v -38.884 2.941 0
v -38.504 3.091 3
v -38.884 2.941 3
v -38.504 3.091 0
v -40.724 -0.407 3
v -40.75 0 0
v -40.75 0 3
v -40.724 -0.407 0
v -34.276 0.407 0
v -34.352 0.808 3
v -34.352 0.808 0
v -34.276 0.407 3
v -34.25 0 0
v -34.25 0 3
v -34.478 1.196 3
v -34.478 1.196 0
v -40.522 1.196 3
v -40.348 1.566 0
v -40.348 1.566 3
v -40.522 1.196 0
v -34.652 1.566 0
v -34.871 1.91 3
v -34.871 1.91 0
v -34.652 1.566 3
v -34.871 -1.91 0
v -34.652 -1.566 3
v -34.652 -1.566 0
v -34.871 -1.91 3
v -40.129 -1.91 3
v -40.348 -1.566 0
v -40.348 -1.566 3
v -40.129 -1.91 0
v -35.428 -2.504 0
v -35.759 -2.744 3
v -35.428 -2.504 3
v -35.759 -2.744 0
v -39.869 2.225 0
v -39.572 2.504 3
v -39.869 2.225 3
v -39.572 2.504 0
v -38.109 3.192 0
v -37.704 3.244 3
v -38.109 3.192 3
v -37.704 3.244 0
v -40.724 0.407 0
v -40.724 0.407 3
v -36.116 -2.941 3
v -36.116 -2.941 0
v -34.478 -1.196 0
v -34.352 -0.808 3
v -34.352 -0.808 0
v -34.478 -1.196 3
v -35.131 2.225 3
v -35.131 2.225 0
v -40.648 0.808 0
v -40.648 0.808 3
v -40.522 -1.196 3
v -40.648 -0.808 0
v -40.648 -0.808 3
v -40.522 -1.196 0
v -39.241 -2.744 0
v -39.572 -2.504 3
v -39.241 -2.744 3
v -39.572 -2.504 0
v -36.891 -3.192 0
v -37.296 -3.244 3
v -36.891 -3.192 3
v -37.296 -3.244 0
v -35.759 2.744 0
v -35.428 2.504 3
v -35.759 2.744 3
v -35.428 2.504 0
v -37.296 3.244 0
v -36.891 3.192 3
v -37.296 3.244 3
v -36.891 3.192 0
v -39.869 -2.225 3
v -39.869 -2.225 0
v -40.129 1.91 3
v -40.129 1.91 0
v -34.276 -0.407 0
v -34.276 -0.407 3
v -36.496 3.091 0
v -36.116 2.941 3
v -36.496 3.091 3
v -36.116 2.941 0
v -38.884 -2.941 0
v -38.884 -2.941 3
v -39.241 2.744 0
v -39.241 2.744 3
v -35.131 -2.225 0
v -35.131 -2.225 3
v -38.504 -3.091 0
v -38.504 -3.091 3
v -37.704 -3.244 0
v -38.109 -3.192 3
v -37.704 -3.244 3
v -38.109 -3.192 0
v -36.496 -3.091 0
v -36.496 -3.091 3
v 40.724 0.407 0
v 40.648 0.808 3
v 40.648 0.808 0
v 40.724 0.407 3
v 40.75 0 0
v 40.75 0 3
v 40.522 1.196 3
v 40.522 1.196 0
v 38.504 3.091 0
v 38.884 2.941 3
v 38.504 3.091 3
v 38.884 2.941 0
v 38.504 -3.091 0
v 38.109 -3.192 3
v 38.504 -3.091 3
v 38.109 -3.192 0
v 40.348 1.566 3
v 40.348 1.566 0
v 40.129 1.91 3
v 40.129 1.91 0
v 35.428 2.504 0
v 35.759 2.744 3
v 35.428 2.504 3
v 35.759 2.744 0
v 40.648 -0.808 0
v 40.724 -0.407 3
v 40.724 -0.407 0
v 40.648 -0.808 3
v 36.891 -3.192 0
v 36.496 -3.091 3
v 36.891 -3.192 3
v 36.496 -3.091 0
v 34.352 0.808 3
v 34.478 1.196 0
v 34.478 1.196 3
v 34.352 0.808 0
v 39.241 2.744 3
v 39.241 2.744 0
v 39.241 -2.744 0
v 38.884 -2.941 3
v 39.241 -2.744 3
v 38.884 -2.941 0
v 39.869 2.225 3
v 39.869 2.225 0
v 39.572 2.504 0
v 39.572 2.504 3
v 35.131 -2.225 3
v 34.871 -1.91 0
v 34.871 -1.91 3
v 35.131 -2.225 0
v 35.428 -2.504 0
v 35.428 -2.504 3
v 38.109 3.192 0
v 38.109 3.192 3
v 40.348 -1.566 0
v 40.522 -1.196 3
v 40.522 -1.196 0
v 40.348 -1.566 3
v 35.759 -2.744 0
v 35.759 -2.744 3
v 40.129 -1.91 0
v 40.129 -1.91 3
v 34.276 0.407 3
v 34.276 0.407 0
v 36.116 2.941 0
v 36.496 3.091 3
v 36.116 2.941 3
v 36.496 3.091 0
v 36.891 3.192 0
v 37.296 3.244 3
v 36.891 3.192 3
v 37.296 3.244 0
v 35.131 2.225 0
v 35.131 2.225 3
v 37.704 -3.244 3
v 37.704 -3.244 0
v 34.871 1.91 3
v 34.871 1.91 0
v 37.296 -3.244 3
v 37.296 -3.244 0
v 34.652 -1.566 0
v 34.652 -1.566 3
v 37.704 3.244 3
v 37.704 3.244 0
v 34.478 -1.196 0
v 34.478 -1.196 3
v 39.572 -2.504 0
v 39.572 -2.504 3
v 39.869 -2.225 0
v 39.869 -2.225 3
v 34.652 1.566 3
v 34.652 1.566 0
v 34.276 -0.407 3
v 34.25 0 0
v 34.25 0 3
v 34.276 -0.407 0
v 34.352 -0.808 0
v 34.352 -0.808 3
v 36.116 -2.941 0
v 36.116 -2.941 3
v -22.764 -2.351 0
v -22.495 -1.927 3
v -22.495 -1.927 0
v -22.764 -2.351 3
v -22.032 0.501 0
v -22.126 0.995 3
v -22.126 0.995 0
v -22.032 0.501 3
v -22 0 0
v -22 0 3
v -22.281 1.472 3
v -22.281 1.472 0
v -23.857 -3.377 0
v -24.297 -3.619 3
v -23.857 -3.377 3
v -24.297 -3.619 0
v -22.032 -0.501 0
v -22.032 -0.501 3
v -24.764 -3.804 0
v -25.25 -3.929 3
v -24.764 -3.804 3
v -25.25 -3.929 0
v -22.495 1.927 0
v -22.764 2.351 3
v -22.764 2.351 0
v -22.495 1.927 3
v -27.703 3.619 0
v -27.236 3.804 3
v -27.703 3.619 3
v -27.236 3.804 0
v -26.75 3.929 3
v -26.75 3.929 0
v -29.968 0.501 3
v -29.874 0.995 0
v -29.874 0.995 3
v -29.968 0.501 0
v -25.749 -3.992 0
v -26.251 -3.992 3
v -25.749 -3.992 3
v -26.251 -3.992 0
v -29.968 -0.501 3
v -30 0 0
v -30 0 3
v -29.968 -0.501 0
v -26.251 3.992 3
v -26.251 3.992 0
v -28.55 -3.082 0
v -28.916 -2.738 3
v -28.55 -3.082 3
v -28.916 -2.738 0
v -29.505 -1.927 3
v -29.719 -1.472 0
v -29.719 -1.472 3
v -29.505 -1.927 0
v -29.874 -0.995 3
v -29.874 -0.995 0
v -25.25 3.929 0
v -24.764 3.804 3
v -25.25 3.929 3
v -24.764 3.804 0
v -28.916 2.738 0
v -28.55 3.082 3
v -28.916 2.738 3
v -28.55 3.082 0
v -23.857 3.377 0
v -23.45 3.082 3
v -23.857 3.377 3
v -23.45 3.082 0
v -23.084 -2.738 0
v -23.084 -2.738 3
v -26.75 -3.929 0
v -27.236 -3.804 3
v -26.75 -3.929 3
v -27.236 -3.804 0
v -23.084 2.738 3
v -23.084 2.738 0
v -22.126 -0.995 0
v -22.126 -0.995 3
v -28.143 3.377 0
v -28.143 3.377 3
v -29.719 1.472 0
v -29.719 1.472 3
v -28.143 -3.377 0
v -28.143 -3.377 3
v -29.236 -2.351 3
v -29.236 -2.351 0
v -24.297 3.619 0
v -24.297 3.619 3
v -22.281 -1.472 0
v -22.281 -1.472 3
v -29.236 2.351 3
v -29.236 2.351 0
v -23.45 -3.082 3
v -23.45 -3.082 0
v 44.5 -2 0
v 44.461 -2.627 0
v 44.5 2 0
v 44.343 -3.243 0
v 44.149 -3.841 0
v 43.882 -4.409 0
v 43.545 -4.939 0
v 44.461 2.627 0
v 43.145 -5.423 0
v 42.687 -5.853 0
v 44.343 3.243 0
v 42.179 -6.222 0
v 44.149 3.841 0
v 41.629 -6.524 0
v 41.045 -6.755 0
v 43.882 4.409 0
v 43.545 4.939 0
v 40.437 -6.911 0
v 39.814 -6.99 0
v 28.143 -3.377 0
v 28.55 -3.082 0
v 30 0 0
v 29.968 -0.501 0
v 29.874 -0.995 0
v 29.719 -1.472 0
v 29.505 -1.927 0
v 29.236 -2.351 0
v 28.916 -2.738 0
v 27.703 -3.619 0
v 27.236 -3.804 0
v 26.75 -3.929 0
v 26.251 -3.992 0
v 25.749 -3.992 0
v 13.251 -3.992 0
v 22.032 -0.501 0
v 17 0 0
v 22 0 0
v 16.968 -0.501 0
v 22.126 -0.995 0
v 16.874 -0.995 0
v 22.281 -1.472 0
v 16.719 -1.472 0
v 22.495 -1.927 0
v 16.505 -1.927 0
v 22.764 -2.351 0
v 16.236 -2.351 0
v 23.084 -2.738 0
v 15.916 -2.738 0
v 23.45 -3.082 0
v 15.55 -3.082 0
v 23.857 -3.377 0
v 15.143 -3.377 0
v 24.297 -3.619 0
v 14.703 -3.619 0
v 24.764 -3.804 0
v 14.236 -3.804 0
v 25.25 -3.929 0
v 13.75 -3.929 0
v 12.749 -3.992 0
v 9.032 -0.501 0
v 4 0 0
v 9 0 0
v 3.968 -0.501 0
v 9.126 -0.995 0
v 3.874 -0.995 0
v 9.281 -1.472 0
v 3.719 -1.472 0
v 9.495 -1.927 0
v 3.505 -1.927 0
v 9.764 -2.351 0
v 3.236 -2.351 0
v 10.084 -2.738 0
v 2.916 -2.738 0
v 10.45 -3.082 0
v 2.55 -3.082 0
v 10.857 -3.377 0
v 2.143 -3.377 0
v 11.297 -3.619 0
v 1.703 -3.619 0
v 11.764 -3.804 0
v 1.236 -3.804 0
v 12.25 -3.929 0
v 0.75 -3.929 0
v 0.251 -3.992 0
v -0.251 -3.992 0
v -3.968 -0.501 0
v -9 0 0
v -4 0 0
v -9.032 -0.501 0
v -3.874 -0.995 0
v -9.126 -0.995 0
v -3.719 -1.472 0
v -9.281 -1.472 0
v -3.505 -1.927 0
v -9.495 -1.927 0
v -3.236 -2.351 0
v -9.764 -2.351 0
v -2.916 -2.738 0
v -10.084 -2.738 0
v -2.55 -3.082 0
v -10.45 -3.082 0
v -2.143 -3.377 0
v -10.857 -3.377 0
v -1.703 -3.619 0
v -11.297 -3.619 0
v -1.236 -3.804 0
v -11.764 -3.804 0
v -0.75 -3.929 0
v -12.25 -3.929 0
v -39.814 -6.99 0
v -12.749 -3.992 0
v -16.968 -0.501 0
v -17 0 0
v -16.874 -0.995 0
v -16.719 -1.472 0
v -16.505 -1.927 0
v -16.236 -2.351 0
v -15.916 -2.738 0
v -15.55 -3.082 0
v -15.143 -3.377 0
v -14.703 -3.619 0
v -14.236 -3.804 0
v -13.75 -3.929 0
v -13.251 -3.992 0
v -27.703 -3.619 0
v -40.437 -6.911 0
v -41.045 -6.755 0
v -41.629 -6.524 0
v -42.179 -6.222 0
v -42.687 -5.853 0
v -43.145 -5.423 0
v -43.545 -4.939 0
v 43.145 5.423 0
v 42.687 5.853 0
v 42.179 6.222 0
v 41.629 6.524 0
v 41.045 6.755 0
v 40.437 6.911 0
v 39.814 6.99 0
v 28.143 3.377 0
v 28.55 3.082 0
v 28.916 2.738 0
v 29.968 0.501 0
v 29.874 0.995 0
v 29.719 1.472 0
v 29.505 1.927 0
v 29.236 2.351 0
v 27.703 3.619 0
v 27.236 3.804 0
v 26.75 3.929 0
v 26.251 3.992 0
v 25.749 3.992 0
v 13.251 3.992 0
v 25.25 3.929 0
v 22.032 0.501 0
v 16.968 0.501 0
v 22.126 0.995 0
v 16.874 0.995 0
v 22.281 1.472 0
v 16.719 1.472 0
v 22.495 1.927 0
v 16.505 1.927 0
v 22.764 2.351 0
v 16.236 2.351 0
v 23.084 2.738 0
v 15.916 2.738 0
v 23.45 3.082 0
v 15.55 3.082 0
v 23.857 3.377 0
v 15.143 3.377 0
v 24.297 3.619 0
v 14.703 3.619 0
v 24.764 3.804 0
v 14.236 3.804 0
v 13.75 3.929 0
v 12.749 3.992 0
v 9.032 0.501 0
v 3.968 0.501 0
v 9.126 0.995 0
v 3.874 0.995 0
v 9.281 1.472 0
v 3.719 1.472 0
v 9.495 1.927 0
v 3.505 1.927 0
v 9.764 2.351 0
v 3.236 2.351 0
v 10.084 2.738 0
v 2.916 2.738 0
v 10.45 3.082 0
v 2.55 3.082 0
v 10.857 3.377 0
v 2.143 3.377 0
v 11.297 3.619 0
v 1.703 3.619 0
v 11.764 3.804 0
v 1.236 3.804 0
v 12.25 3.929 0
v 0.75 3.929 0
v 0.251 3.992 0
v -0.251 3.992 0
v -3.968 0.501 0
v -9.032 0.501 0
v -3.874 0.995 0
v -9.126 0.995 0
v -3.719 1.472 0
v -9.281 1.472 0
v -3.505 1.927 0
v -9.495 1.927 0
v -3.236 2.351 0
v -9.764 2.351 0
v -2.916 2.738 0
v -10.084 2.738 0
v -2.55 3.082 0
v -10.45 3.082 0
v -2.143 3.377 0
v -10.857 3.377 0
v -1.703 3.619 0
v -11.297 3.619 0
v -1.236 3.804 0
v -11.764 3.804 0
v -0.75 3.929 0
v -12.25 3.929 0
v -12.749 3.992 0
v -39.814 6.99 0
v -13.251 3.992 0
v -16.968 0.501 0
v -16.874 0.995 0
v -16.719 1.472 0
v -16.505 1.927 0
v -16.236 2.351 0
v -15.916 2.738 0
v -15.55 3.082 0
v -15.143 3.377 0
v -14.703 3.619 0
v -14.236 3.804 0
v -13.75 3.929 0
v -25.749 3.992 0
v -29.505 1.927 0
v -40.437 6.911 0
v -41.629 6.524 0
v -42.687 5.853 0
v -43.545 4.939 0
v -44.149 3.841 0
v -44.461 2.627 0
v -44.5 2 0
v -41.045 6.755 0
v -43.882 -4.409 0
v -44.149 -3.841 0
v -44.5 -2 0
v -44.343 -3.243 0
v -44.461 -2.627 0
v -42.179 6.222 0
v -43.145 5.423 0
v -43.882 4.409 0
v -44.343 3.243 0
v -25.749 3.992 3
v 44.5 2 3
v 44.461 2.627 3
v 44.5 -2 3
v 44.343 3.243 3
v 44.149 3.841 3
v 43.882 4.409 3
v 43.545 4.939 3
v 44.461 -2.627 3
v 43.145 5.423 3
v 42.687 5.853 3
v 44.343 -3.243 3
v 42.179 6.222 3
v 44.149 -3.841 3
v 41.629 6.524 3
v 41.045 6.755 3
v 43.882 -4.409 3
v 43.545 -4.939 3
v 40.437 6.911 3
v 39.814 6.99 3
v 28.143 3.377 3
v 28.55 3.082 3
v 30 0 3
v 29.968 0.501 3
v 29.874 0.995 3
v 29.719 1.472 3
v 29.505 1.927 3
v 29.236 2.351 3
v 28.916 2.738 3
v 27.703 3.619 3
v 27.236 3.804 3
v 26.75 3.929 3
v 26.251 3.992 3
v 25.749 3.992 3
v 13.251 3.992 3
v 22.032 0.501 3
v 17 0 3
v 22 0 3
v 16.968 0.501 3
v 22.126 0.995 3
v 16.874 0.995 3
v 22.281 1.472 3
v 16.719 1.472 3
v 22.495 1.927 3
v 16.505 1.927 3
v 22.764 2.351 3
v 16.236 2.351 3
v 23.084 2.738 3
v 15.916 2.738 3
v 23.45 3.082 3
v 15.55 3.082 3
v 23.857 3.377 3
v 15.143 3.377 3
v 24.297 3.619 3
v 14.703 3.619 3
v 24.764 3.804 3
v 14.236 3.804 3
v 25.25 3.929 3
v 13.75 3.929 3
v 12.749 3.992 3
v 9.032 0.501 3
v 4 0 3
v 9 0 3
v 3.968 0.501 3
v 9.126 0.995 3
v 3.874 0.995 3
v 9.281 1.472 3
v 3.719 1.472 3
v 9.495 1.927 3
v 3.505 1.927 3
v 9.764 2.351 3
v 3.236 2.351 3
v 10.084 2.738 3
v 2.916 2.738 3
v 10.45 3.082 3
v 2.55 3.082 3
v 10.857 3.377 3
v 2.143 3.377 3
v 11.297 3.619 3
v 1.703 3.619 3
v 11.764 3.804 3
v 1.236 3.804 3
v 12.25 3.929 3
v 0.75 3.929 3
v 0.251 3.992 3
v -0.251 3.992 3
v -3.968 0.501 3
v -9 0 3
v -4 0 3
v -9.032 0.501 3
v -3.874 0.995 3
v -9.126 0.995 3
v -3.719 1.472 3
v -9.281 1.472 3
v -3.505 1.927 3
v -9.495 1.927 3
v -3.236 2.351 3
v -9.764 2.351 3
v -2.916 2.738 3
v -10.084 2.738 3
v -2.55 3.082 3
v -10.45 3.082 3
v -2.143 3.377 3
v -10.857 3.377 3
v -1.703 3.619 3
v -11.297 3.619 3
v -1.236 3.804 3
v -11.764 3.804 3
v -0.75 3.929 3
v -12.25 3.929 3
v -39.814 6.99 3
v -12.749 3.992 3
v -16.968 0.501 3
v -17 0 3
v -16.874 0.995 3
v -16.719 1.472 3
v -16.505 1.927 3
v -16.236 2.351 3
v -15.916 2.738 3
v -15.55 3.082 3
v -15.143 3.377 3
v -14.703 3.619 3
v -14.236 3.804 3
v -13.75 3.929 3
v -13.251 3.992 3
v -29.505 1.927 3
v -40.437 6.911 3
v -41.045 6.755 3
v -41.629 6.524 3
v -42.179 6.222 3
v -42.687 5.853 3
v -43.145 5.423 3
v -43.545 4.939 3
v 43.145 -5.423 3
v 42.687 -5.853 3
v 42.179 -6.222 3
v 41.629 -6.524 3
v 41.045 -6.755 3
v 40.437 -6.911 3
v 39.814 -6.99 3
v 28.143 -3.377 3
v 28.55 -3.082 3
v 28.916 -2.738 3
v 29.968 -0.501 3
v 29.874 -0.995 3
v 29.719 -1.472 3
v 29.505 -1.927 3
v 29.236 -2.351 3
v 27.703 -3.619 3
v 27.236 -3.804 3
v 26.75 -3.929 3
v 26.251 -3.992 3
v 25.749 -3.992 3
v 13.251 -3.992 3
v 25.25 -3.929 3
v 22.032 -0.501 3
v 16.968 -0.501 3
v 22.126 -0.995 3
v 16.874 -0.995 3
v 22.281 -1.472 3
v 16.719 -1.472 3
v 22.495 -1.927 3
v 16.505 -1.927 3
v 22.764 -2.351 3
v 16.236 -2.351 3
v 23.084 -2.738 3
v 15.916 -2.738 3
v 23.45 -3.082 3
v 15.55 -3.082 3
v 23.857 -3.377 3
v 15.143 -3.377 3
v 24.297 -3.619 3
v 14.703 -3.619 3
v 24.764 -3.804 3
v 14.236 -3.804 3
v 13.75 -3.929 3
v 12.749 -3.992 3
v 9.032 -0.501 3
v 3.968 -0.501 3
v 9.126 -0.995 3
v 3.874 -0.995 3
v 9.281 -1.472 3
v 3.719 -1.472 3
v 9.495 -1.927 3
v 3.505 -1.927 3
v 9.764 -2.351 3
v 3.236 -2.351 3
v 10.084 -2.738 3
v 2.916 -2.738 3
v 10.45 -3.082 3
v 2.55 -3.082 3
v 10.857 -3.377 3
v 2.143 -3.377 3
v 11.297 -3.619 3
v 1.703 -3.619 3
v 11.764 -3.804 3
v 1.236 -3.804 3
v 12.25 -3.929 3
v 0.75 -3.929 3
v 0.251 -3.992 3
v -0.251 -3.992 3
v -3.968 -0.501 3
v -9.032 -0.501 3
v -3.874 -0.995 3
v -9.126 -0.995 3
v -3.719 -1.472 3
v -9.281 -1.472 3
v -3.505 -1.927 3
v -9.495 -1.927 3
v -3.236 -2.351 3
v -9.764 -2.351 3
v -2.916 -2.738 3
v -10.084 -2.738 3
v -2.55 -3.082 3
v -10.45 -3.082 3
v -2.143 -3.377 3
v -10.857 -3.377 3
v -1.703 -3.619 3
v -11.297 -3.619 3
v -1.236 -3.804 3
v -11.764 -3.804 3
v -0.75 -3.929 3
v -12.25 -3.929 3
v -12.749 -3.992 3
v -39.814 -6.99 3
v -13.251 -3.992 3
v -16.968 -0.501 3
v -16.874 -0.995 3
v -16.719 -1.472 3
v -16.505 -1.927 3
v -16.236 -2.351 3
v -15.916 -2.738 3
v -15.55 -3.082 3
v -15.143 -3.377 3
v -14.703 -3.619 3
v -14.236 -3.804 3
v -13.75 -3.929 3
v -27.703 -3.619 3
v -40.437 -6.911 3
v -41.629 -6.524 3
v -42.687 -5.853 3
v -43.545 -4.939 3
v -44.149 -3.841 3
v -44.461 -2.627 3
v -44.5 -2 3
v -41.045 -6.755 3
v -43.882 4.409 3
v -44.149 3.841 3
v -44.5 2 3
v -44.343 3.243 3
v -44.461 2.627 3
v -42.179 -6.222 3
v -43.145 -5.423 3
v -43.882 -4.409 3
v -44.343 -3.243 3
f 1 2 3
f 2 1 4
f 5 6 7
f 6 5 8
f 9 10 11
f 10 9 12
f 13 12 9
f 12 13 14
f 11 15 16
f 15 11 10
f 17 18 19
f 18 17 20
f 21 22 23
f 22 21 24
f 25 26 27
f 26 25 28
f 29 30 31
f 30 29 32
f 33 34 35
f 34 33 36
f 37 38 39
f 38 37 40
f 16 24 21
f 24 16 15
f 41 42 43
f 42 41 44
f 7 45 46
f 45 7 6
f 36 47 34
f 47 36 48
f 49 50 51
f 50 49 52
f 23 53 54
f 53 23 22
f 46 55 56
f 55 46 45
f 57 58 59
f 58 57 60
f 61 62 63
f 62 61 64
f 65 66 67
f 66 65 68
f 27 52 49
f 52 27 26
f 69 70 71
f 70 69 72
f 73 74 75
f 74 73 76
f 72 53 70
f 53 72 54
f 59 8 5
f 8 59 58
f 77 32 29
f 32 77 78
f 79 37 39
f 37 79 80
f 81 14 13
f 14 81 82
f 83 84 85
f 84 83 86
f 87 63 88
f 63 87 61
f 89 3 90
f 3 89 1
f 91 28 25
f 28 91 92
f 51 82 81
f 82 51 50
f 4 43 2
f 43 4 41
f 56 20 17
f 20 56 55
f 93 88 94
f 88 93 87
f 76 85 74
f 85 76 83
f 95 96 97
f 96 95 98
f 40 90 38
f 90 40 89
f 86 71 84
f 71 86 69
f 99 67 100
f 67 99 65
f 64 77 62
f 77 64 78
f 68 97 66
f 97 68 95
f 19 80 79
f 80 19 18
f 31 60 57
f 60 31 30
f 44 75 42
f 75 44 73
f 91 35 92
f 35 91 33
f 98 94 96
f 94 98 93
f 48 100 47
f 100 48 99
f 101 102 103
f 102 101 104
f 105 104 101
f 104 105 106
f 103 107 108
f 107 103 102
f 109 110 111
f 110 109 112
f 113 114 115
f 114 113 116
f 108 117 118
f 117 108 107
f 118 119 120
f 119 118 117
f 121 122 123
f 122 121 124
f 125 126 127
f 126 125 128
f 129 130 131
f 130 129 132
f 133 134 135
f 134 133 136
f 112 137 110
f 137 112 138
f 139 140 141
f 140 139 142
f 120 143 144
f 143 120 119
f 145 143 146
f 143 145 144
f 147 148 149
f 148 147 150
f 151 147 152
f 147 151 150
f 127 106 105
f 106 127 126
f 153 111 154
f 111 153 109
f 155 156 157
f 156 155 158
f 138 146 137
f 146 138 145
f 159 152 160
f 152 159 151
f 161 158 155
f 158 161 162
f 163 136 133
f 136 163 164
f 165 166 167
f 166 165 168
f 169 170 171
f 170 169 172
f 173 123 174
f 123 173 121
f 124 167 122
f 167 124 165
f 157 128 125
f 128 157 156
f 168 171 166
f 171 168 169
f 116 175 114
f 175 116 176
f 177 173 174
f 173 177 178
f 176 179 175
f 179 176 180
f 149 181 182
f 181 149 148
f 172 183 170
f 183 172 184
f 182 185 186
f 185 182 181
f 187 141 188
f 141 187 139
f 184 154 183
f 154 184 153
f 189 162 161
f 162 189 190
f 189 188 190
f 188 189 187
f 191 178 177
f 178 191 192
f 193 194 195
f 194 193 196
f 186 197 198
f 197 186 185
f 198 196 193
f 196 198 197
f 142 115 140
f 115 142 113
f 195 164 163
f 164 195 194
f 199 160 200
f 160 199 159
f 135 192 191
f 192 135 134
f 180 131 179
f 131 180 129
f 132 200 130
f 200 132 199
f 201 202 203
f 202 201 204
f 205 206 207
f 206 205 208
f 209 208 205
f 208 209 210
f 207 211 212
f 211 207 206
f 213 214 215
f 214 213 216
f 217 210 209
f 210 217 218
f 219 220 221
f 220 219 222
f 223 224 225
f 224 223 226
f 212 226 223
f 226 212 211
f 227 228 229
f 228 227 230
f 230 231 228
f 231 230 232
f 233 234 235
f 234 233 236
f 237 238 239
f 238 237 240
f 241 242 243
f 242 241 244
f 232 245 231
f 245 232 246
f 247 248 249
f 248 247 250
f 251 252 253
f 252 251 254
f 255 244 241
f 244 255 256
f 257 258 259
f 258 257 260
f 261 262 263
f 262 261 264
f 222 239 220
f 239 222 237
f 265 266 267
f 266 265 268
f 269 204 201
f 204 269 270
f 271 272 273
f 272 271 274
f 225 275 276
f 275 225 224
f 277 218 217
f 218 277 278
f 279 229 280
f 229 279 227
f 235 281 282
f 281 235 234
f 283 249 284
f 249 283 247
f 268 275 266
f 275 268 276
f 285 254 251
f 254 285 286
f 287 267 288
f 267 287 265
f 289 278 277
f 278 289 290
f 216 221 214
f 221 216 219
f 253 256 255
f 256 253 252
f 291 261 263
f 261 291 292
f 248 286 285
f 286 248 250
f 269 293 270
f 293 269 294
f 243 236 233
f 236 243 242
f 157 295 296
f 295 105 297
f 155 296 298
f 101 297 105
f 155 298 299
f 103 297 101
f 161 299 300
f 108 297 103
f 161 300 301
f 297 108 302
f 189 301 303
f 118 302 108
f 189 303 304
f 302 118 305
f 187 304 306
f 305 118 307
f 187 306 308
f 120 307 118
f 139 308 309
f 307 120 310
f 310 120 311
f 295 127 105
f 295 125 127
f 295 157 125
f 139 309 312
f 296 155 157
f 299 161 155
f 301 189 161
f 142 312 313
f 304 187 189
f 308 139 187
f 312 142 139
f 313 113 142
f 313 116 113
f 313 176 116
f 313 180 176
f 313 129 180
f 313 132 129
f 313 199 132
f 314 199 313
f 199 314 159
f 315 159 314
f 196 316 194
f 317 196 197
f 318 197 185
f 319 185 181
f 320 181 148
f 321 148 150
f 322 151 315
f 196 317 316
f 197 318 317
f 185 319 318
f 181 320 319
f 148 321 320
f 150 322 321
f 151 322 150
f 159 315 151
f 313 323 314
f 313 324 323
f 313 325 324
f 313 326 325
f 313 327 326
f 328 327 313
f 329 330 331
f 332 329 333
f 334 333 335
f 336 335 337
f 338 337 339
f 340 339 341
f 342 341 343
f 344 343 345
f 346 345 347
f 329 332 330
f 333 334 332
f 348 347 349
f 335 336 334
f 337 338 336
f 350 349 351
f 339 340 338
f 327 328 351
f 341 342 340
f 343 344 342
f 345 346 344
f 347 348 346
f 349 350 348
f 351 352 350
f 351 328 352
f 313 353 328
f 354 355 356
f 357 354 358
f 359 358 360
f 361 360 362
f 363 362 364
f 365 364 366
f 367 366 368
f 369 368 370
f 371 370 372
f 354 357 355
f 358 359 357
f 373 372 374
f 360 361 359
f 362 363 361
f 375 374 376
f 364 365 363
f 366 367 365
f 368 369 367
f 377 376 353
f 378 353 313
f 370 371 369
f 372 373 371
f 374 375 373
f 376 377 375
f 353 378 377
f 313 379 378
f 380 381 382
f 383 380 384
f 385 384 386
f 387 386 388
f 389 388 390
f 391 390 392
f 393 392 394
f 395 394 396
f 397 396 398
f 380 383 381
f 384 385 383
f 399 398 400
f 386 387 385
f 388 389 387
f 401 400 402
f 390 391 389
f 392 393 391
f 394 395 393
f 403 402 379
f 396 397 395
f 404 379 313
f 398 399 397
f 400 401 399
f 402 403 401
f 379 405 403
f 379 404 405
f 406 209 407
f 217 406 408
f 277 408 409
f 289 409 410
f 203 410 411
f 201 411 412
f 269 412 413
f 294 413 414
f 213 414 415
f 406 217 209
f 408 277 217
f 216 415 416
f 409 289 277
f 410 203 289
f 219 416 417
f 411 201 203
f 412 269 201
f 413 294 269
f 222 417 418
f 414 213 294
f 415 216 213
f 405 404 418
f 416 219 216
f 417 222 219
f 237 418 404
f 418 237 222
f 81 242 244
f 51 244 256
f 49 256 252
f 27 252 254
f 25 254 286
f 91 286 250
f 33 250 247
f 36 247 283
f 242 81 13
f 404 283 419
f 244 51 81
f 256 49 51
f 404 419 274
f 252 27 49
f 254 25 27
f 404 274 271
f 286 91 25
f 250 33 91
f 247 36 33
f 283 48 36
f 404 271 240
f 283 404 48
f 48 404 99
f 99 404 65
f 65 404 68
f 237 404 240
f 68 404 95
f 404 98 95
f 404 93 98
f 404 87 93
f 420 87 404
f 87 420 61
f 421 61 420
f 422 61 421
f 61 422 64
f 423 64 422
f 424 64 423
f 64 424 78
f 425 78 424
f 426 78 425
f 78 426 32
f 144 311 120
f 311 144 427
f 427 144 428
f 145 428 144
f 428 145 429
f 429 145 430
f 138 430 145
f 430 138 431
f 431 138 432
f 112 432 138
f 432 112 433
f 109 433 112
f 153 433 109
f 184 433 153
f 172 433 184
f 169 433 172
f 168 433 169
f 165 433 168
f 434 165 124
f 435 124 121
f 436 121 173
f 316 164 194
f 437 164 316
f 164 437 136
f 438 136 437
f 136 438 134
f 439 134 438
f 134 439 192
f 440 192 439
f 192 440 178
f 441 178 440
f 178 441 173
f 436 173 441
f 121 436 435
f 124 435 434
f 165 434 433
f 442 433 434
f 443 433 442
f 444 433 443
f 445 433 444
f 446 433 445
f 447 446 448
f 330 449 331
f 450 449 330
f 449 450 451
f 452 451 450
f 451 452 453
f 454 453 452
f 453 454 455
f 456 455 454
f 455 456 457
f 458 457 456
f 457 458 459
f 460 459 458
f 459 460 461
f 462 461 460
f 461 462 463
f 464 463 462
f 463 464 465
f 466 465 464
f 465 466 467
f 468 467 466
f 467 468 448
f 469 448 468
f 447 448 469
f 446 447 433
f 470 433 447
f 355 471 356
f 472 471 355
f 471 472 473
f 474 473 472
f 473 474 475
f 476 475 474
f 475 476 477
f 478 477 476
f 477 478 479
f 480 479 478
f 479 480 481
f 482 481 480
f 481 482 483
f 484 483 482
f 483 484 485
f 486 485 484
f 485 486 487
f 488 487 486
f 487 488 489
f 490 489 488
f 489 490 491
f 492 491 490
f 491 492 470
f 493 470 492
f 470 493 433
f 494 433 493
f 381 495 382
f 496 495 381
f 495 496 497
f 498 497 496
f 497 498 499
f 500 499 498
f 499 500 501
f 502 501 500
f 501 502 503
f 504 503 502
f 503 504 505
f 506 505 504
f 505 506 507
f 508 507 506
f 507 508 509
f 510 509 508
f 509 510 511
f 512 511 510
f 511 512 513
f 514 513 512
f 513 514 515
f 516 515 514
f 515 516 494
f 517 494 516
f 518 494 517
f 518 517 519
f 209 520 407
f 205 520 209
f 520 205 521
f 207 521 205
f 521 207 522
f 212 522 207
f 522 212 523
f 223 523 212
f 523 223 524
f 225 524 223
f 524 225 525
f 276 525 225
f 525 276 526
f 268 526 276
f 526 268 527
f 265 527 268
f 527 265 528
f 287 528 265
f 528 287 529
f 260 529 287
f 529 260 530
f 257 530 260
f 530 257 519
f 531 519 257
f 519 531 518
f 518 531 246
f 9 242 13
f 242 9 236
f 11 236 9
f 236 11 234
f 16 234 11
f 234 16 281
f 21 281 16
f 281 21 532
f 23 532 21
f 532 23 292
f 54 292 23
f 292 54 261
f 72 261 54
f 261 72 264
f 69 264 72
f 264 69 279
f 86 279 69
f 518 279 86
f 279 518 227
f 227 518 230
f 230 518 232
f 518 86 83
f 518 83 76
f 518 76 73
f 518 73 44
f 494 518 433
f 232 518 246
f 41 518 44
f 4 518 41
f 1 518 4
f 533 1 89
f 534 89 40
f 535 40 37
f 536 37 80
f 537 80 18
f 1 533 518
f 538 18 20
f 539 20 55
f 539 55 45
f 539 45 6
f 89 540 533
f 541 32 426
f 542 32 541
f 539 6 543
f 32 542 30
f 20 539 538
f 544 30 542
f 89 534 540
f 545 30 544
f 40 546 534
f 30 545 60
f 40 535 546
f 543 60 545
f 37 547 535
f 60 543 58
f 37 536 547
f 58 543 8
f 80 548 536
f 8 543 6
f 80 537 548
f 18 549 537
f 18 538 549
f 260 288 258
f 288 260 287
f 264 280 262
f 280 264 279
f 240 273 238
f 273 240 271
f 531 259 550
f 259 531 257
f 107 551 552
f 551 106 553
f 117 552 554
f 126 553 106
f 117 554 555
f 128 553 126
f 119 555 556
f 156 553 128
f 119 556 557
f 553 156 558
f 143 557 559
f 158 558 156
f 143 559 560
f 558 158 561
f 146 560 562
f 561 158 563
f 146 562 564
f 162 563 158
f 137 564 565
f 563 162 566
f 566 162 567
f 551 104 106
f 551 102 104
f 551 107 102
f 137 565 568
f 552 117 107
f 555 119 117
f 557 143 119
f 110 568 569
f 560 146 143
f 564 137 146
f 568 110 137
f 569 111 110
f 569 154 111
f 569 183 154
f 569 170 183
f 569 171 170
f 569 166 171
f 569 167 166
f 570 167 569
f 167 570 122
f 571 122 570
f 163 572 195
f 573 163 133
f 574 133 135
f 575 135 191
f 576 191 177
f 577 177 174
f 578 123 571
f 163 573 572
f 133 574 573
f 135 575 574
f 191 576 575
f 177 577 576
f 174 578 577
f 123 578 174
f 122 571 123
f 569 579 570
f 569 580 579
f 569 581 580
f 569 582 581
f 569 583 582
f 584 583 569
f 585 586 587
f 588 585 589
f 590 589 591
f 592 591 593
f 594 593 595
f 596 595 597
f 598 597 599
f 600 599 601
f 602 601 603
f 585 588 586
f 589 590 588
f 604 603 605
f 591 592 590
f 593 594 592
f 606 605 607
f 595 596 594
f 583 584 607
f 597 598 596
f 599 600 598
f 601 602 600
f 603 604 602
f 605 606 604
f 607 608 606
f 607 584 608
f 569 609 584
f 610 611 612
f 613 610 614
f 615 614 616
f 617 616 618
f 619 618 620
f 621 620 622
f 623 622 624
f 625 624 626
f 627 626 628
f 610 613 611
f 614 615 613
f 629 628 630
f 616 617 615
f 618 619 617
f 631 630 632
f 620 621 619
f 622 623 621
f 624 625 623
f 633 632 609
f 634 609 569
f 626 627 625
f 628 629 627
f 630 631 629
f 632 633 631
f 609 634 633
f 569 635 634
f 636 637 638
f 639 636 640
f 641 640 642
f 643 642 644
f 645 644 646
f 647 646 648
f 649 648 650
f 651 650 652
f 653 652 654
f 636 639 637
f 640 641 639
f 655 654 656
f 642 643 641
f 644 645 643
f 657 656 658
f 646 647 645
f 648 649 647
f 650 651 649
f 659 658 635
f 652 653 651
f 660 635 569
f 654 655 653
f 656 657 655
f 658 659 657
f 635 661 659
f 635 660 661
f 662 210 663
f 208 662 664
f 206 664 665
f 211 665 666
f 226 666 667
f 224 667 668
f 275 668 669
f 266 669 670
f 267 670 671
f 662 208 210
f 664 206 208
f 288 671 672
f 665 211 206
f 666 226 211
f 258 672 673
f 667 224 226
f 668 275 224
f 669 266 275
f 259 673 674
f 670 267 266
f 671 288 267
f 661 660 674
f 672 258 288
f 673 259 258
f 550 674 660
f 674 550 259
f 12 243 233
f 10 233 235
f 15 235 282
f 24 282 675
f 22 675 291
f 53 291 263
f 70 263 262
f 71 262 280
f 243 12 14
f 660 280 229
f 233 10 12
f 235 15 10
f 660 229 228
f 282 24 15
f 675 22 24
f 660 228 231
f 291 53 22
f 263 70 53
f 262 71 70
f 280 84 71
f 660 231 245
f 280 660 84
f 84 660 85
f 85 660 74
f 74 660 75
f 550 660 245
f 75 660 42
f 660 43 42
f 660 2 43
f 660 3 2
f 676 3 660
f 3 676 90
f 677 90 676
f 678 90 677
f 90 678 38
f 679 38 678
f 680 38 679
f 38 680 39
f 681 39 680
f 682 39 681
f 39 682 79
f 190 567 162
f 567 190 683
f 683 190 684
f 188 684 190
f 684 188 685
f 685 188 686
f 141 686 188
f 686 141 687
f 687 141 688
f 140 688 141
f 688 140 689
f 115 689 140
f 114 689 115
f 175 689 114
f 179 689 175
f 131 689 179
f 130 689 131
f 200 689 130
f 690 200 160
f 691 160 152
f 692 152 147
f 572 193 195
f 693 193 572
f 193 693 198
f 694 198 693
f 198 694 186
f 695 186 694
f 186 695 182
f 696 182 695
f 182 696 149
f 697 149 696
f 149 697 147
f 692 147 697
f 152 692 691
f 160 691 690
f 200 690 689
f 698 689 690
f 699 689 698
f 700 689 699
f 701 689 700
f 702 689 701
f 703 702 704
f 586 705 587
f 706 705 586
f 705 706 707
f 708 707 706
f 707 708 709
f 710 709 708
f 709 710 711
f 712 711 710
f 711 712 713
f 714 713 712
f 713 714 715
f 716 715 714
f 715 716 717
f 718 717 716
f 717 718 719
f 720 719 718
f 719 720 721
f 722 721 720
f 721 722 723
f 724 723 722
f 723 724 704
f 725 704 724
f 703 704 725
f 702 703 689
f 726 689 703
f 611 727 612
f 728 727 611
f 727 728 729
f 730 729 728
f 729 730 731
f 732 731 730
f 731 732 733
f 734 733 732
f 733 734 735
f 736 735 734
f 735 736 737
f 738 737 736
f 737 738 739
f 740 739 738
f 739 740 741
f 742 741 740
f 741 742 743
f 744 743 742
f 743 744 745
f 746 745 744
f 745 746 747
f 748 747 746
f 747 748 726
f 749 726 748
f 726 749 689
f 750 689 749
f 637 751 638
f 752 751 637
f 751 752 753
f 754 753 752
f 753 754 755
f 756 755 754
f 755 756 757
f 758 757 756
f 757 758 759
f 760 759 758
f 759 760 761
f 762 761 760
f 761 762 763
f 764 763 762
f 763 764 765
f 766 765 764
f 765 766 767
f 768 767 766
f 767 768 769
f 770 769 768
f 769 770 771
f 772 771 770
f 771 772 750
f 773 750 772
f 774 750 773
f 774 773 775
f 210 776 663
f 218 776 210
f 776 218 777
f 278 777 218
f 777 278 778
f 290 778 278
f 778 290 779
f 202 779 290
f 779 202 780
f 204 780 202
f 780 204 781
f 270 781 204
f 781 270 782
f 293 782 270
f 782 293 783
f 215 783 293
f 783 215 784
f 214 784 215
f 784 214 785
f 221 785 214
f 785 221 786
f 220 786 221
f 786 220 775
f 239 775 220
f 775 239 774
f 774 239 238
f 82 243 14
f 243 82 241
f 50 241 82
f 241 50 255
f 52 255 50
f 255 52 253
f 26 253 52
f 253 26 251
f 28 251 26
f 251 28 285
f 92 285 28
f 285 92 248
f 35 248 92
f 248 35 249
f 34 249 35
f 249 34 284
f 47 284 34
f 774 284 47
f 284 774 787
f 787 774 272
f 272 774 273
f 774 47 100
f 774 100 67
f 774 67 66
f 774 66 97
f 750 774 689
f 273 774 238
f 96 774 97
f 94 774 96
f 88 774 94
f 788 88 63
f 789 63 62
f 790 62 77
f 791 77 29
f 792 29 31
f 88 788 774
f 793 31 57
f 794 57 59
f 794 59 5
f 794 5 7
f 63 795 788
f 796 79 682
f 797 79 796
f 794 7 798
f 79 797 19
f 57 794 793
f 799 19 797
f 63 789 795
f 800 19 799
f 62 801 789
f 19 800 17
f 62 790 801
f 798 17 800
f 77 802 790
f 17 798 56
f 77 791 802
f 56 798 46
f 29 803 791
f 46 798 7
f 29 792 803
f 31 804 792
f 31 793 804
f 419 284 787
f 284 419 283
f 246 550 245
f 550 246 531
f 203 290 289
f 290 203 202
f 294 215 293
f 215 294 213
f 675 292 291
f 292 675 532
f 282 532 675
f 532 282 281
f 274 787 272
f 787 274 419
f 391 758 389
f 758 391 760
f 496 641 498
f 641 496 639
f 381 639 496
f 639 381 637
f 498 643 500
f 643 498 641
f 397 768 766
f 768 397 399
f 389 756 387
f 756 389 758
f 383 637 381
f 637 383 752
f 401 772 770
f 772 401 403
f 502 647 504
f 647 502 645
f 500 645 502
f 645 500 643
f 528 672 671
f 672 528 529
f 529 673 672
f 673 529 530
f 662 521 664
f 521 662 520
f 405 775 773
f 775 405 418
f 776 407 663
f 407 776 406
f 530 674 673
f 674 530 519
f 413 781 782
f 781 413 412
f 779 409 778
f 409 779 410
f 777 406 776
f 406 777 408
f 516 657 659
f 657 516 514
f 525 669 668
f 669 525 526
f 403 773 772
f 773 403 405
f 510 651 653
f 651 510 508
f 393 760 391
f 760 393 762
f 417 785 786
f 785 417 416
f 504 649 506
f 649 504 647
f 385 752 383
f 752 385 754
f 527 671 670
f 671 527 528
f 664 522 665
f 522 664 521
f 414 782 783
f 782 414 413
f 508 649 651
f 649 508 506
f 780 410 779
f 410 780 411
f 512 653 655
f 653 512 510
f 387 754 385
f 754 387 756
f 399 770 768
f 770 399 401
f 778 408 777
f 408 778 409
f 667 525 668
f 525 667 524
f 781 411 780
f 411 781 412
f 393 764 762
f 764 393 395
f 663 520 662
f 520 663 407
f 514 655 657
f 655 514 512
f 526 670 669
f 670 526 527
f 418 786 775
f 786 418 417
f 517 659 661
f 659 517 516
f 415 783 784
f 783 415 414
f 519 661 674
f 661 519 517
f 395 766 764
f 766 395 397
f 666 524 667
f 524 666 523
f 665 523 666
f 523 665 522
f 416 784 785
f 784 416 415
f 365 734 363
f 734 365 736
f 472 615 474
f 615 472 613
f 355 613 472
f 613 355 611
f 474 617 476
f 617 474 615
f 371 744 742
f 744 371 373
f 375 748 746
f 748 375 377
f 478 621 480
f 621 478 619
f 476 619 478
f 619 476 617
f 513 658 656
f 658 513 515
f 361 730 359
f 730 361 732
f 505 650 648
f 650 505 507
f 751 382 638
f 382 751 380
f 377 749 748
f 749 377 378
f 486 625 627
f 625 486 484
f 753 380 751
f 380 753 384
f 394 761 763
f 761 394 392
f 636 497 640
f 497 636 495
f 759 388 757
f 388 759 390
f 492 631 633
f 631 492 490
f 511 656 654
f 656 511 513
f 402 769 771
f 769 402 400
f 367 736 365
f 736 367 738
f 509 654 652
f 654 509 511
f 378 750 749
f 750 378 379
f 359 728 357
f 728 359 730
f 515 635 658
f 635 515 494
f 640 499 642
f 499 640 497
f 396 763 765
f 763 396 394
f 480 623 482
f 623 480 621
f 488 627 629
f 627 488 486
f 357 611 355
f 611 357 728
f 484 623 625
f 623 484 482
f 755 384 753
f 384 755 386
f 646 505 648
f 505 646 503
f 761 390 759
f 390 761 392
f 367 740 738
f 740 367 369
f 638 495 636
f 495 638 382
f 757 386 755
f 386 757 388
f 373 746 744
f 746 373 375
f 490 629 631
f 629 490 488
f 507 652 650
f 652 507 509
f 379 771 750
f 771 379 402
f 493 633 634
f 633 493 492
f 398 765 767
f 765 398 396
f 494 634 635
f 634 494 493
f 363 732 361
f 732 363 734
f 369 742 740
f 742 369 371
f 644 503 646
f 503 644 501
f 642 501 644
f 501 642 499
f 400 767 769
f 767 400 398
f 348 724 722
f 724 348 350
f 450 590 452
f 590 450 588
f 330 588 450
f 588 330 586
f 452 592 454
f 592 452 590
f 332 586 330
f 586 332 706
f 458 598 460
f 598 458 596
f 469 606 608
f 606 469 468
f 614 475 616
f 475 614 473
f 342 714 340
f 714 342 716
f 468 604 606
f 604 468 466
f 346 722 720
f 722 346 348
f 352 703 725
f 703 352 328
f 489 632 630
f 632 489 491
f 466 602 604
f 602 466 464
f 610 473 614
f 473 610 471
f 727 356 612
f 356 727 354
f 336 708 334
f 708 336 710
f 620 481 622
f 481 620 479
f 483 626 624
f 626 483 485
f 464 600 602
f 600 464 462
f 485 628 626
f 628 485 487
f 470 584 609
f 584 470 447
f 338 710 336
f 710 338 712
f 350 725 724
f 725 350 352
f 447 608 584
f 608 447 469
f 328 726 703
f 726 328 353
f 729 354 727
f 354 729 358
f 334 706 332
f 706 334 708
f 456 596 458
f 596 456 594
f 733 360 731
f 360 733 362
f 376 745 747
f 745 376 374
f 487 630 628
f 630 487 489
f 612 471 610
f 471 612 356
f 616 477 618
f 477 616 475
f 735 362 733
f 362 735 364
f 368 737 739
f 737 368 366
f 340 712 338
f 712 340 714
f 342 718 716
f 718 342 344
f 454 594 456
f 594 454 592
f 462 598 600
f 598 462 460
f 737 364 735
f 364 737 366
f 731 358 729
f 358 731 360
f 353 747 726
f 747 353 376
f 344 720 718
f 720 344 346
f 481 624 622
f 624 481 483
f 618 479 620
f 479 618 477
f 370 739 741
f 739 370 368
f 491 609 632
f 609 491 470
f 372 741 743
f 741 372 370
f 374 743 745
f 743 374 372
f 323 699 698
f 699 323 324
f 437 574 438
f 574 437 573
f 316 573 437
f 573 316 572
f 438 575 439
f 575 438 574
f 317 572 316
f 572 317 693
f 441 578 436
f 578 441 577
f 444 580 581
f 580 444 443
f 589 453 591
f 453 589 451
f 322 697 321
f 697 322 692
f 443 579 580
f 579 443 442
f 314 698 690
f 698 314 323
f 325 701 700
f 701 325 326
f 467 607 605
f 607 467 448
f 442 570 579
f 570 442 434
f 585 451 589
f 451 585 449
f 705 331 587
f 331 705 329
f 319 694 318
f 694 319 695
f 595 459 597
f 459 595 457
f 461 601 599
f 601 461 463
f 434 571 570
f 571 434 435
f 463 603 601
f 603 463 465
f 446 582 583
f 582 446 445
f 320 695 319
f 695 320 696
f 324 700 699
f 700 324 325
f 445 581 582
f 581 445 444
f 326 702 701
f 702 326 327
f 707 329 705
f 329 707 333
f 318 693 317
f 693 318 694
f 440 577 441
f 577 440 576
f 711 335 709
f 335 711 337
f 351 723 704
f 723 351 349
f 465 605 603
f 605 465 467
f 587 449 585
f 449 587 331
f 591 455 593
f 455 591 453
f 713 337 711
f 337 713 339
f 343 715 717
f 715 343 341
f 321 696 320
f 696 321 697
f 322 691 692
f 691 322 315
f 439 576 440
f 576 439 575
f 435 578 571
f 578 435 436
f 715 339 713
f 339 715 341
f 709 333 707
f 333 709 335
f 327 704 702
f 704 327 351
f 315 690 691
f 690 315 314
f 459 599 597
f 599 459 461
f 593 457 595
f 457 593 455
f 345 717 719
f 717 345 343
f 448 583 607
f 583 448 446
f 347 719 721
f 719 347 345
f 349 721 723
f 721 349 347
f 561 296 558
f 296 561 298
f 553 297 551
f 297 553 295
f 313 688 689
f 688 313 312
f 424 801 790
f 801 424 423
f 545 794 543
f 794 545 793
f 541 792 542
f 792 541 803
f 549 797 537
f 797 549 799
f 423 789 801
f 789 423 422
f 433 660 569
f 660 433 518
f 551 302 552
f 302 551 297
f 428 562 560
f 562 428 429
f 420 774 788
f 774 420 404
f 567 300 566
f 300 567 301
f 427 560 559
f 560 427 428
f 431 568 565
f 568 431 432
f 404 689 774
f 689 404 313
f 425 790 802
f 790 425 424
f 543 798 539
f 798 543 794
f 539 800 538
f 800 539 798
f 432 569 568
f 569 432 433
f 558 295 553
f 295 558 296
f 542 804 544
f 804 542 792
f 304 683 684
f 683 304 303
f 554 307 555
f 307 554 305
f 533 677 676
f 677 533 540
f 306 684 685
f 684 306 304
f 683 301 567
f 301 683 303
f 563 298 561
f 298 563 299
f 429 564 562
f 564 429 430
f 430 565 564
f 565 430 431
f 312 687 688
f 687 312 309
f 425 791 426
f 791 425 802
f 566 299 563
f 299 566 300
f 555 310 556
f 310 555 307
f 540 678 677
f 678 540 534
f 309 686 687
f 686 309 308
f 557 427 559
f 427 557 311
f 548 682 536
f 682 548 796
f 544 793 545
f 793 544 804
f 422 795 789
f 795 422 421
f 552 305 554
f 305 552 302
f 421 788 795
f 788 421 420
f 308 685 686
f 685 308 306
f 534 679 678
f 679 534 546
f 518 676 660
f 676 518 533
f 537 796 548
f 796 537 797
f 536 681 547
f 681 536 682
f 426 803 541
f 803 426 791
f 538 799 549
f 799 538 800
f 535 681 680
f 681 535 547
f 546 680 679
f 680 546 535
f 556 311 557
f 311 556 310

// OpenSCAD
$fn = 50;


difference() {
	union() {
		hull() {
			translate(v = [-39.5000000000, 2.0000000000, 0]) {
				cylinder(h = 3, r = 5);
			}
			translate(v = [39.5000000000, 2.0000000000, 0]) {
				cylinder(h = 3, r = 5);
			}
			translate(v = [-39.5000000000, -2.0000000000, 0]) {
				cylinder(h = 3, r = 5);
			}
			translate(v = [39.5000000000, -2.0000000000, 0]) {
				cylinder(h = 3, r = 5);
			}
		}
	}
	union() {
		#translate(v = [-37.5000000000, 0.0000000000, 0]) {
			cylinder(h = 3, r = 3.2500000000);
		}
		#translate(v = [37.5000000000, 0.0000000000, 0]) {
			cylinder(h = 3, r = 3.2500000000);
		}
		#translate(v = [-37.5000000000, 0.0000000000, -100.0000000000]) {
			cylinder(h = 200, r = 3.2500000000);
		}
		#translate(v = [-37.5000000000, 0.0000000000, -100.0000000000]) {
			cylinder(h = 200, r = 3.2500000000);
		}
		#translate(v = [37.5000000000, 0.0000000000, -100.0000000000]) {
			cylinder(h = 200, r = 3.2500000000);
		}
		#translate(v = [37.5000000000, 0.0000000000, -100.0000000000]) {
			cylinder(h = 200, r = 3.2500000000);
		}
		#translate(v = [-37.5000000000, 0.0000000000, 0]) {
			cylinder(h = 3, r = 1.8000000000);
		}
		#translate(v = [37.5000000000, 0.0000000000, 0]) {
			cylinder(h = 3, r = 1.8000000000);
		}
		#translate(v = [-37.5000000000, 0.0000000000, 0]) {
			cylinder(h = 3, r = 1.8000000000);
		}
		#translate(v = [37.5000000000, 0.0000000000, 0]) {
			cylinder(h = 3, r = 1.8000000000);
		}
		#translate(v = [-37.5000000000, 0.0000000000, 0]) {
			cylinder(h = 3, r = 1.8000000000);
		}
		#translate(v = [37.5000000000, 0.0000000000, 0]) {
			cylinder(h = 3, r = 1.8000000000);
		}
		#translate(v = [-26.0000000000, 0, 0]) {
			cylinder(h = 3, r = 4.0000000000);
		}
		#translate(v = [-13.0000000000, 0, 0]) {
			cylinder(h = 3, r = 4.0000000000);
		}
		#cylinder(h = 3, r = 4.0000000000);
		#translate(v = [13.0000000000, 0, 0]) {
			cylinder(h = 3, r = 4.0000000000);
		}
		#translate(v = [26.0000000000, 0, 0]) {
			cylinder(h = 3, r = 4.0000000000);
		}
	}
}
